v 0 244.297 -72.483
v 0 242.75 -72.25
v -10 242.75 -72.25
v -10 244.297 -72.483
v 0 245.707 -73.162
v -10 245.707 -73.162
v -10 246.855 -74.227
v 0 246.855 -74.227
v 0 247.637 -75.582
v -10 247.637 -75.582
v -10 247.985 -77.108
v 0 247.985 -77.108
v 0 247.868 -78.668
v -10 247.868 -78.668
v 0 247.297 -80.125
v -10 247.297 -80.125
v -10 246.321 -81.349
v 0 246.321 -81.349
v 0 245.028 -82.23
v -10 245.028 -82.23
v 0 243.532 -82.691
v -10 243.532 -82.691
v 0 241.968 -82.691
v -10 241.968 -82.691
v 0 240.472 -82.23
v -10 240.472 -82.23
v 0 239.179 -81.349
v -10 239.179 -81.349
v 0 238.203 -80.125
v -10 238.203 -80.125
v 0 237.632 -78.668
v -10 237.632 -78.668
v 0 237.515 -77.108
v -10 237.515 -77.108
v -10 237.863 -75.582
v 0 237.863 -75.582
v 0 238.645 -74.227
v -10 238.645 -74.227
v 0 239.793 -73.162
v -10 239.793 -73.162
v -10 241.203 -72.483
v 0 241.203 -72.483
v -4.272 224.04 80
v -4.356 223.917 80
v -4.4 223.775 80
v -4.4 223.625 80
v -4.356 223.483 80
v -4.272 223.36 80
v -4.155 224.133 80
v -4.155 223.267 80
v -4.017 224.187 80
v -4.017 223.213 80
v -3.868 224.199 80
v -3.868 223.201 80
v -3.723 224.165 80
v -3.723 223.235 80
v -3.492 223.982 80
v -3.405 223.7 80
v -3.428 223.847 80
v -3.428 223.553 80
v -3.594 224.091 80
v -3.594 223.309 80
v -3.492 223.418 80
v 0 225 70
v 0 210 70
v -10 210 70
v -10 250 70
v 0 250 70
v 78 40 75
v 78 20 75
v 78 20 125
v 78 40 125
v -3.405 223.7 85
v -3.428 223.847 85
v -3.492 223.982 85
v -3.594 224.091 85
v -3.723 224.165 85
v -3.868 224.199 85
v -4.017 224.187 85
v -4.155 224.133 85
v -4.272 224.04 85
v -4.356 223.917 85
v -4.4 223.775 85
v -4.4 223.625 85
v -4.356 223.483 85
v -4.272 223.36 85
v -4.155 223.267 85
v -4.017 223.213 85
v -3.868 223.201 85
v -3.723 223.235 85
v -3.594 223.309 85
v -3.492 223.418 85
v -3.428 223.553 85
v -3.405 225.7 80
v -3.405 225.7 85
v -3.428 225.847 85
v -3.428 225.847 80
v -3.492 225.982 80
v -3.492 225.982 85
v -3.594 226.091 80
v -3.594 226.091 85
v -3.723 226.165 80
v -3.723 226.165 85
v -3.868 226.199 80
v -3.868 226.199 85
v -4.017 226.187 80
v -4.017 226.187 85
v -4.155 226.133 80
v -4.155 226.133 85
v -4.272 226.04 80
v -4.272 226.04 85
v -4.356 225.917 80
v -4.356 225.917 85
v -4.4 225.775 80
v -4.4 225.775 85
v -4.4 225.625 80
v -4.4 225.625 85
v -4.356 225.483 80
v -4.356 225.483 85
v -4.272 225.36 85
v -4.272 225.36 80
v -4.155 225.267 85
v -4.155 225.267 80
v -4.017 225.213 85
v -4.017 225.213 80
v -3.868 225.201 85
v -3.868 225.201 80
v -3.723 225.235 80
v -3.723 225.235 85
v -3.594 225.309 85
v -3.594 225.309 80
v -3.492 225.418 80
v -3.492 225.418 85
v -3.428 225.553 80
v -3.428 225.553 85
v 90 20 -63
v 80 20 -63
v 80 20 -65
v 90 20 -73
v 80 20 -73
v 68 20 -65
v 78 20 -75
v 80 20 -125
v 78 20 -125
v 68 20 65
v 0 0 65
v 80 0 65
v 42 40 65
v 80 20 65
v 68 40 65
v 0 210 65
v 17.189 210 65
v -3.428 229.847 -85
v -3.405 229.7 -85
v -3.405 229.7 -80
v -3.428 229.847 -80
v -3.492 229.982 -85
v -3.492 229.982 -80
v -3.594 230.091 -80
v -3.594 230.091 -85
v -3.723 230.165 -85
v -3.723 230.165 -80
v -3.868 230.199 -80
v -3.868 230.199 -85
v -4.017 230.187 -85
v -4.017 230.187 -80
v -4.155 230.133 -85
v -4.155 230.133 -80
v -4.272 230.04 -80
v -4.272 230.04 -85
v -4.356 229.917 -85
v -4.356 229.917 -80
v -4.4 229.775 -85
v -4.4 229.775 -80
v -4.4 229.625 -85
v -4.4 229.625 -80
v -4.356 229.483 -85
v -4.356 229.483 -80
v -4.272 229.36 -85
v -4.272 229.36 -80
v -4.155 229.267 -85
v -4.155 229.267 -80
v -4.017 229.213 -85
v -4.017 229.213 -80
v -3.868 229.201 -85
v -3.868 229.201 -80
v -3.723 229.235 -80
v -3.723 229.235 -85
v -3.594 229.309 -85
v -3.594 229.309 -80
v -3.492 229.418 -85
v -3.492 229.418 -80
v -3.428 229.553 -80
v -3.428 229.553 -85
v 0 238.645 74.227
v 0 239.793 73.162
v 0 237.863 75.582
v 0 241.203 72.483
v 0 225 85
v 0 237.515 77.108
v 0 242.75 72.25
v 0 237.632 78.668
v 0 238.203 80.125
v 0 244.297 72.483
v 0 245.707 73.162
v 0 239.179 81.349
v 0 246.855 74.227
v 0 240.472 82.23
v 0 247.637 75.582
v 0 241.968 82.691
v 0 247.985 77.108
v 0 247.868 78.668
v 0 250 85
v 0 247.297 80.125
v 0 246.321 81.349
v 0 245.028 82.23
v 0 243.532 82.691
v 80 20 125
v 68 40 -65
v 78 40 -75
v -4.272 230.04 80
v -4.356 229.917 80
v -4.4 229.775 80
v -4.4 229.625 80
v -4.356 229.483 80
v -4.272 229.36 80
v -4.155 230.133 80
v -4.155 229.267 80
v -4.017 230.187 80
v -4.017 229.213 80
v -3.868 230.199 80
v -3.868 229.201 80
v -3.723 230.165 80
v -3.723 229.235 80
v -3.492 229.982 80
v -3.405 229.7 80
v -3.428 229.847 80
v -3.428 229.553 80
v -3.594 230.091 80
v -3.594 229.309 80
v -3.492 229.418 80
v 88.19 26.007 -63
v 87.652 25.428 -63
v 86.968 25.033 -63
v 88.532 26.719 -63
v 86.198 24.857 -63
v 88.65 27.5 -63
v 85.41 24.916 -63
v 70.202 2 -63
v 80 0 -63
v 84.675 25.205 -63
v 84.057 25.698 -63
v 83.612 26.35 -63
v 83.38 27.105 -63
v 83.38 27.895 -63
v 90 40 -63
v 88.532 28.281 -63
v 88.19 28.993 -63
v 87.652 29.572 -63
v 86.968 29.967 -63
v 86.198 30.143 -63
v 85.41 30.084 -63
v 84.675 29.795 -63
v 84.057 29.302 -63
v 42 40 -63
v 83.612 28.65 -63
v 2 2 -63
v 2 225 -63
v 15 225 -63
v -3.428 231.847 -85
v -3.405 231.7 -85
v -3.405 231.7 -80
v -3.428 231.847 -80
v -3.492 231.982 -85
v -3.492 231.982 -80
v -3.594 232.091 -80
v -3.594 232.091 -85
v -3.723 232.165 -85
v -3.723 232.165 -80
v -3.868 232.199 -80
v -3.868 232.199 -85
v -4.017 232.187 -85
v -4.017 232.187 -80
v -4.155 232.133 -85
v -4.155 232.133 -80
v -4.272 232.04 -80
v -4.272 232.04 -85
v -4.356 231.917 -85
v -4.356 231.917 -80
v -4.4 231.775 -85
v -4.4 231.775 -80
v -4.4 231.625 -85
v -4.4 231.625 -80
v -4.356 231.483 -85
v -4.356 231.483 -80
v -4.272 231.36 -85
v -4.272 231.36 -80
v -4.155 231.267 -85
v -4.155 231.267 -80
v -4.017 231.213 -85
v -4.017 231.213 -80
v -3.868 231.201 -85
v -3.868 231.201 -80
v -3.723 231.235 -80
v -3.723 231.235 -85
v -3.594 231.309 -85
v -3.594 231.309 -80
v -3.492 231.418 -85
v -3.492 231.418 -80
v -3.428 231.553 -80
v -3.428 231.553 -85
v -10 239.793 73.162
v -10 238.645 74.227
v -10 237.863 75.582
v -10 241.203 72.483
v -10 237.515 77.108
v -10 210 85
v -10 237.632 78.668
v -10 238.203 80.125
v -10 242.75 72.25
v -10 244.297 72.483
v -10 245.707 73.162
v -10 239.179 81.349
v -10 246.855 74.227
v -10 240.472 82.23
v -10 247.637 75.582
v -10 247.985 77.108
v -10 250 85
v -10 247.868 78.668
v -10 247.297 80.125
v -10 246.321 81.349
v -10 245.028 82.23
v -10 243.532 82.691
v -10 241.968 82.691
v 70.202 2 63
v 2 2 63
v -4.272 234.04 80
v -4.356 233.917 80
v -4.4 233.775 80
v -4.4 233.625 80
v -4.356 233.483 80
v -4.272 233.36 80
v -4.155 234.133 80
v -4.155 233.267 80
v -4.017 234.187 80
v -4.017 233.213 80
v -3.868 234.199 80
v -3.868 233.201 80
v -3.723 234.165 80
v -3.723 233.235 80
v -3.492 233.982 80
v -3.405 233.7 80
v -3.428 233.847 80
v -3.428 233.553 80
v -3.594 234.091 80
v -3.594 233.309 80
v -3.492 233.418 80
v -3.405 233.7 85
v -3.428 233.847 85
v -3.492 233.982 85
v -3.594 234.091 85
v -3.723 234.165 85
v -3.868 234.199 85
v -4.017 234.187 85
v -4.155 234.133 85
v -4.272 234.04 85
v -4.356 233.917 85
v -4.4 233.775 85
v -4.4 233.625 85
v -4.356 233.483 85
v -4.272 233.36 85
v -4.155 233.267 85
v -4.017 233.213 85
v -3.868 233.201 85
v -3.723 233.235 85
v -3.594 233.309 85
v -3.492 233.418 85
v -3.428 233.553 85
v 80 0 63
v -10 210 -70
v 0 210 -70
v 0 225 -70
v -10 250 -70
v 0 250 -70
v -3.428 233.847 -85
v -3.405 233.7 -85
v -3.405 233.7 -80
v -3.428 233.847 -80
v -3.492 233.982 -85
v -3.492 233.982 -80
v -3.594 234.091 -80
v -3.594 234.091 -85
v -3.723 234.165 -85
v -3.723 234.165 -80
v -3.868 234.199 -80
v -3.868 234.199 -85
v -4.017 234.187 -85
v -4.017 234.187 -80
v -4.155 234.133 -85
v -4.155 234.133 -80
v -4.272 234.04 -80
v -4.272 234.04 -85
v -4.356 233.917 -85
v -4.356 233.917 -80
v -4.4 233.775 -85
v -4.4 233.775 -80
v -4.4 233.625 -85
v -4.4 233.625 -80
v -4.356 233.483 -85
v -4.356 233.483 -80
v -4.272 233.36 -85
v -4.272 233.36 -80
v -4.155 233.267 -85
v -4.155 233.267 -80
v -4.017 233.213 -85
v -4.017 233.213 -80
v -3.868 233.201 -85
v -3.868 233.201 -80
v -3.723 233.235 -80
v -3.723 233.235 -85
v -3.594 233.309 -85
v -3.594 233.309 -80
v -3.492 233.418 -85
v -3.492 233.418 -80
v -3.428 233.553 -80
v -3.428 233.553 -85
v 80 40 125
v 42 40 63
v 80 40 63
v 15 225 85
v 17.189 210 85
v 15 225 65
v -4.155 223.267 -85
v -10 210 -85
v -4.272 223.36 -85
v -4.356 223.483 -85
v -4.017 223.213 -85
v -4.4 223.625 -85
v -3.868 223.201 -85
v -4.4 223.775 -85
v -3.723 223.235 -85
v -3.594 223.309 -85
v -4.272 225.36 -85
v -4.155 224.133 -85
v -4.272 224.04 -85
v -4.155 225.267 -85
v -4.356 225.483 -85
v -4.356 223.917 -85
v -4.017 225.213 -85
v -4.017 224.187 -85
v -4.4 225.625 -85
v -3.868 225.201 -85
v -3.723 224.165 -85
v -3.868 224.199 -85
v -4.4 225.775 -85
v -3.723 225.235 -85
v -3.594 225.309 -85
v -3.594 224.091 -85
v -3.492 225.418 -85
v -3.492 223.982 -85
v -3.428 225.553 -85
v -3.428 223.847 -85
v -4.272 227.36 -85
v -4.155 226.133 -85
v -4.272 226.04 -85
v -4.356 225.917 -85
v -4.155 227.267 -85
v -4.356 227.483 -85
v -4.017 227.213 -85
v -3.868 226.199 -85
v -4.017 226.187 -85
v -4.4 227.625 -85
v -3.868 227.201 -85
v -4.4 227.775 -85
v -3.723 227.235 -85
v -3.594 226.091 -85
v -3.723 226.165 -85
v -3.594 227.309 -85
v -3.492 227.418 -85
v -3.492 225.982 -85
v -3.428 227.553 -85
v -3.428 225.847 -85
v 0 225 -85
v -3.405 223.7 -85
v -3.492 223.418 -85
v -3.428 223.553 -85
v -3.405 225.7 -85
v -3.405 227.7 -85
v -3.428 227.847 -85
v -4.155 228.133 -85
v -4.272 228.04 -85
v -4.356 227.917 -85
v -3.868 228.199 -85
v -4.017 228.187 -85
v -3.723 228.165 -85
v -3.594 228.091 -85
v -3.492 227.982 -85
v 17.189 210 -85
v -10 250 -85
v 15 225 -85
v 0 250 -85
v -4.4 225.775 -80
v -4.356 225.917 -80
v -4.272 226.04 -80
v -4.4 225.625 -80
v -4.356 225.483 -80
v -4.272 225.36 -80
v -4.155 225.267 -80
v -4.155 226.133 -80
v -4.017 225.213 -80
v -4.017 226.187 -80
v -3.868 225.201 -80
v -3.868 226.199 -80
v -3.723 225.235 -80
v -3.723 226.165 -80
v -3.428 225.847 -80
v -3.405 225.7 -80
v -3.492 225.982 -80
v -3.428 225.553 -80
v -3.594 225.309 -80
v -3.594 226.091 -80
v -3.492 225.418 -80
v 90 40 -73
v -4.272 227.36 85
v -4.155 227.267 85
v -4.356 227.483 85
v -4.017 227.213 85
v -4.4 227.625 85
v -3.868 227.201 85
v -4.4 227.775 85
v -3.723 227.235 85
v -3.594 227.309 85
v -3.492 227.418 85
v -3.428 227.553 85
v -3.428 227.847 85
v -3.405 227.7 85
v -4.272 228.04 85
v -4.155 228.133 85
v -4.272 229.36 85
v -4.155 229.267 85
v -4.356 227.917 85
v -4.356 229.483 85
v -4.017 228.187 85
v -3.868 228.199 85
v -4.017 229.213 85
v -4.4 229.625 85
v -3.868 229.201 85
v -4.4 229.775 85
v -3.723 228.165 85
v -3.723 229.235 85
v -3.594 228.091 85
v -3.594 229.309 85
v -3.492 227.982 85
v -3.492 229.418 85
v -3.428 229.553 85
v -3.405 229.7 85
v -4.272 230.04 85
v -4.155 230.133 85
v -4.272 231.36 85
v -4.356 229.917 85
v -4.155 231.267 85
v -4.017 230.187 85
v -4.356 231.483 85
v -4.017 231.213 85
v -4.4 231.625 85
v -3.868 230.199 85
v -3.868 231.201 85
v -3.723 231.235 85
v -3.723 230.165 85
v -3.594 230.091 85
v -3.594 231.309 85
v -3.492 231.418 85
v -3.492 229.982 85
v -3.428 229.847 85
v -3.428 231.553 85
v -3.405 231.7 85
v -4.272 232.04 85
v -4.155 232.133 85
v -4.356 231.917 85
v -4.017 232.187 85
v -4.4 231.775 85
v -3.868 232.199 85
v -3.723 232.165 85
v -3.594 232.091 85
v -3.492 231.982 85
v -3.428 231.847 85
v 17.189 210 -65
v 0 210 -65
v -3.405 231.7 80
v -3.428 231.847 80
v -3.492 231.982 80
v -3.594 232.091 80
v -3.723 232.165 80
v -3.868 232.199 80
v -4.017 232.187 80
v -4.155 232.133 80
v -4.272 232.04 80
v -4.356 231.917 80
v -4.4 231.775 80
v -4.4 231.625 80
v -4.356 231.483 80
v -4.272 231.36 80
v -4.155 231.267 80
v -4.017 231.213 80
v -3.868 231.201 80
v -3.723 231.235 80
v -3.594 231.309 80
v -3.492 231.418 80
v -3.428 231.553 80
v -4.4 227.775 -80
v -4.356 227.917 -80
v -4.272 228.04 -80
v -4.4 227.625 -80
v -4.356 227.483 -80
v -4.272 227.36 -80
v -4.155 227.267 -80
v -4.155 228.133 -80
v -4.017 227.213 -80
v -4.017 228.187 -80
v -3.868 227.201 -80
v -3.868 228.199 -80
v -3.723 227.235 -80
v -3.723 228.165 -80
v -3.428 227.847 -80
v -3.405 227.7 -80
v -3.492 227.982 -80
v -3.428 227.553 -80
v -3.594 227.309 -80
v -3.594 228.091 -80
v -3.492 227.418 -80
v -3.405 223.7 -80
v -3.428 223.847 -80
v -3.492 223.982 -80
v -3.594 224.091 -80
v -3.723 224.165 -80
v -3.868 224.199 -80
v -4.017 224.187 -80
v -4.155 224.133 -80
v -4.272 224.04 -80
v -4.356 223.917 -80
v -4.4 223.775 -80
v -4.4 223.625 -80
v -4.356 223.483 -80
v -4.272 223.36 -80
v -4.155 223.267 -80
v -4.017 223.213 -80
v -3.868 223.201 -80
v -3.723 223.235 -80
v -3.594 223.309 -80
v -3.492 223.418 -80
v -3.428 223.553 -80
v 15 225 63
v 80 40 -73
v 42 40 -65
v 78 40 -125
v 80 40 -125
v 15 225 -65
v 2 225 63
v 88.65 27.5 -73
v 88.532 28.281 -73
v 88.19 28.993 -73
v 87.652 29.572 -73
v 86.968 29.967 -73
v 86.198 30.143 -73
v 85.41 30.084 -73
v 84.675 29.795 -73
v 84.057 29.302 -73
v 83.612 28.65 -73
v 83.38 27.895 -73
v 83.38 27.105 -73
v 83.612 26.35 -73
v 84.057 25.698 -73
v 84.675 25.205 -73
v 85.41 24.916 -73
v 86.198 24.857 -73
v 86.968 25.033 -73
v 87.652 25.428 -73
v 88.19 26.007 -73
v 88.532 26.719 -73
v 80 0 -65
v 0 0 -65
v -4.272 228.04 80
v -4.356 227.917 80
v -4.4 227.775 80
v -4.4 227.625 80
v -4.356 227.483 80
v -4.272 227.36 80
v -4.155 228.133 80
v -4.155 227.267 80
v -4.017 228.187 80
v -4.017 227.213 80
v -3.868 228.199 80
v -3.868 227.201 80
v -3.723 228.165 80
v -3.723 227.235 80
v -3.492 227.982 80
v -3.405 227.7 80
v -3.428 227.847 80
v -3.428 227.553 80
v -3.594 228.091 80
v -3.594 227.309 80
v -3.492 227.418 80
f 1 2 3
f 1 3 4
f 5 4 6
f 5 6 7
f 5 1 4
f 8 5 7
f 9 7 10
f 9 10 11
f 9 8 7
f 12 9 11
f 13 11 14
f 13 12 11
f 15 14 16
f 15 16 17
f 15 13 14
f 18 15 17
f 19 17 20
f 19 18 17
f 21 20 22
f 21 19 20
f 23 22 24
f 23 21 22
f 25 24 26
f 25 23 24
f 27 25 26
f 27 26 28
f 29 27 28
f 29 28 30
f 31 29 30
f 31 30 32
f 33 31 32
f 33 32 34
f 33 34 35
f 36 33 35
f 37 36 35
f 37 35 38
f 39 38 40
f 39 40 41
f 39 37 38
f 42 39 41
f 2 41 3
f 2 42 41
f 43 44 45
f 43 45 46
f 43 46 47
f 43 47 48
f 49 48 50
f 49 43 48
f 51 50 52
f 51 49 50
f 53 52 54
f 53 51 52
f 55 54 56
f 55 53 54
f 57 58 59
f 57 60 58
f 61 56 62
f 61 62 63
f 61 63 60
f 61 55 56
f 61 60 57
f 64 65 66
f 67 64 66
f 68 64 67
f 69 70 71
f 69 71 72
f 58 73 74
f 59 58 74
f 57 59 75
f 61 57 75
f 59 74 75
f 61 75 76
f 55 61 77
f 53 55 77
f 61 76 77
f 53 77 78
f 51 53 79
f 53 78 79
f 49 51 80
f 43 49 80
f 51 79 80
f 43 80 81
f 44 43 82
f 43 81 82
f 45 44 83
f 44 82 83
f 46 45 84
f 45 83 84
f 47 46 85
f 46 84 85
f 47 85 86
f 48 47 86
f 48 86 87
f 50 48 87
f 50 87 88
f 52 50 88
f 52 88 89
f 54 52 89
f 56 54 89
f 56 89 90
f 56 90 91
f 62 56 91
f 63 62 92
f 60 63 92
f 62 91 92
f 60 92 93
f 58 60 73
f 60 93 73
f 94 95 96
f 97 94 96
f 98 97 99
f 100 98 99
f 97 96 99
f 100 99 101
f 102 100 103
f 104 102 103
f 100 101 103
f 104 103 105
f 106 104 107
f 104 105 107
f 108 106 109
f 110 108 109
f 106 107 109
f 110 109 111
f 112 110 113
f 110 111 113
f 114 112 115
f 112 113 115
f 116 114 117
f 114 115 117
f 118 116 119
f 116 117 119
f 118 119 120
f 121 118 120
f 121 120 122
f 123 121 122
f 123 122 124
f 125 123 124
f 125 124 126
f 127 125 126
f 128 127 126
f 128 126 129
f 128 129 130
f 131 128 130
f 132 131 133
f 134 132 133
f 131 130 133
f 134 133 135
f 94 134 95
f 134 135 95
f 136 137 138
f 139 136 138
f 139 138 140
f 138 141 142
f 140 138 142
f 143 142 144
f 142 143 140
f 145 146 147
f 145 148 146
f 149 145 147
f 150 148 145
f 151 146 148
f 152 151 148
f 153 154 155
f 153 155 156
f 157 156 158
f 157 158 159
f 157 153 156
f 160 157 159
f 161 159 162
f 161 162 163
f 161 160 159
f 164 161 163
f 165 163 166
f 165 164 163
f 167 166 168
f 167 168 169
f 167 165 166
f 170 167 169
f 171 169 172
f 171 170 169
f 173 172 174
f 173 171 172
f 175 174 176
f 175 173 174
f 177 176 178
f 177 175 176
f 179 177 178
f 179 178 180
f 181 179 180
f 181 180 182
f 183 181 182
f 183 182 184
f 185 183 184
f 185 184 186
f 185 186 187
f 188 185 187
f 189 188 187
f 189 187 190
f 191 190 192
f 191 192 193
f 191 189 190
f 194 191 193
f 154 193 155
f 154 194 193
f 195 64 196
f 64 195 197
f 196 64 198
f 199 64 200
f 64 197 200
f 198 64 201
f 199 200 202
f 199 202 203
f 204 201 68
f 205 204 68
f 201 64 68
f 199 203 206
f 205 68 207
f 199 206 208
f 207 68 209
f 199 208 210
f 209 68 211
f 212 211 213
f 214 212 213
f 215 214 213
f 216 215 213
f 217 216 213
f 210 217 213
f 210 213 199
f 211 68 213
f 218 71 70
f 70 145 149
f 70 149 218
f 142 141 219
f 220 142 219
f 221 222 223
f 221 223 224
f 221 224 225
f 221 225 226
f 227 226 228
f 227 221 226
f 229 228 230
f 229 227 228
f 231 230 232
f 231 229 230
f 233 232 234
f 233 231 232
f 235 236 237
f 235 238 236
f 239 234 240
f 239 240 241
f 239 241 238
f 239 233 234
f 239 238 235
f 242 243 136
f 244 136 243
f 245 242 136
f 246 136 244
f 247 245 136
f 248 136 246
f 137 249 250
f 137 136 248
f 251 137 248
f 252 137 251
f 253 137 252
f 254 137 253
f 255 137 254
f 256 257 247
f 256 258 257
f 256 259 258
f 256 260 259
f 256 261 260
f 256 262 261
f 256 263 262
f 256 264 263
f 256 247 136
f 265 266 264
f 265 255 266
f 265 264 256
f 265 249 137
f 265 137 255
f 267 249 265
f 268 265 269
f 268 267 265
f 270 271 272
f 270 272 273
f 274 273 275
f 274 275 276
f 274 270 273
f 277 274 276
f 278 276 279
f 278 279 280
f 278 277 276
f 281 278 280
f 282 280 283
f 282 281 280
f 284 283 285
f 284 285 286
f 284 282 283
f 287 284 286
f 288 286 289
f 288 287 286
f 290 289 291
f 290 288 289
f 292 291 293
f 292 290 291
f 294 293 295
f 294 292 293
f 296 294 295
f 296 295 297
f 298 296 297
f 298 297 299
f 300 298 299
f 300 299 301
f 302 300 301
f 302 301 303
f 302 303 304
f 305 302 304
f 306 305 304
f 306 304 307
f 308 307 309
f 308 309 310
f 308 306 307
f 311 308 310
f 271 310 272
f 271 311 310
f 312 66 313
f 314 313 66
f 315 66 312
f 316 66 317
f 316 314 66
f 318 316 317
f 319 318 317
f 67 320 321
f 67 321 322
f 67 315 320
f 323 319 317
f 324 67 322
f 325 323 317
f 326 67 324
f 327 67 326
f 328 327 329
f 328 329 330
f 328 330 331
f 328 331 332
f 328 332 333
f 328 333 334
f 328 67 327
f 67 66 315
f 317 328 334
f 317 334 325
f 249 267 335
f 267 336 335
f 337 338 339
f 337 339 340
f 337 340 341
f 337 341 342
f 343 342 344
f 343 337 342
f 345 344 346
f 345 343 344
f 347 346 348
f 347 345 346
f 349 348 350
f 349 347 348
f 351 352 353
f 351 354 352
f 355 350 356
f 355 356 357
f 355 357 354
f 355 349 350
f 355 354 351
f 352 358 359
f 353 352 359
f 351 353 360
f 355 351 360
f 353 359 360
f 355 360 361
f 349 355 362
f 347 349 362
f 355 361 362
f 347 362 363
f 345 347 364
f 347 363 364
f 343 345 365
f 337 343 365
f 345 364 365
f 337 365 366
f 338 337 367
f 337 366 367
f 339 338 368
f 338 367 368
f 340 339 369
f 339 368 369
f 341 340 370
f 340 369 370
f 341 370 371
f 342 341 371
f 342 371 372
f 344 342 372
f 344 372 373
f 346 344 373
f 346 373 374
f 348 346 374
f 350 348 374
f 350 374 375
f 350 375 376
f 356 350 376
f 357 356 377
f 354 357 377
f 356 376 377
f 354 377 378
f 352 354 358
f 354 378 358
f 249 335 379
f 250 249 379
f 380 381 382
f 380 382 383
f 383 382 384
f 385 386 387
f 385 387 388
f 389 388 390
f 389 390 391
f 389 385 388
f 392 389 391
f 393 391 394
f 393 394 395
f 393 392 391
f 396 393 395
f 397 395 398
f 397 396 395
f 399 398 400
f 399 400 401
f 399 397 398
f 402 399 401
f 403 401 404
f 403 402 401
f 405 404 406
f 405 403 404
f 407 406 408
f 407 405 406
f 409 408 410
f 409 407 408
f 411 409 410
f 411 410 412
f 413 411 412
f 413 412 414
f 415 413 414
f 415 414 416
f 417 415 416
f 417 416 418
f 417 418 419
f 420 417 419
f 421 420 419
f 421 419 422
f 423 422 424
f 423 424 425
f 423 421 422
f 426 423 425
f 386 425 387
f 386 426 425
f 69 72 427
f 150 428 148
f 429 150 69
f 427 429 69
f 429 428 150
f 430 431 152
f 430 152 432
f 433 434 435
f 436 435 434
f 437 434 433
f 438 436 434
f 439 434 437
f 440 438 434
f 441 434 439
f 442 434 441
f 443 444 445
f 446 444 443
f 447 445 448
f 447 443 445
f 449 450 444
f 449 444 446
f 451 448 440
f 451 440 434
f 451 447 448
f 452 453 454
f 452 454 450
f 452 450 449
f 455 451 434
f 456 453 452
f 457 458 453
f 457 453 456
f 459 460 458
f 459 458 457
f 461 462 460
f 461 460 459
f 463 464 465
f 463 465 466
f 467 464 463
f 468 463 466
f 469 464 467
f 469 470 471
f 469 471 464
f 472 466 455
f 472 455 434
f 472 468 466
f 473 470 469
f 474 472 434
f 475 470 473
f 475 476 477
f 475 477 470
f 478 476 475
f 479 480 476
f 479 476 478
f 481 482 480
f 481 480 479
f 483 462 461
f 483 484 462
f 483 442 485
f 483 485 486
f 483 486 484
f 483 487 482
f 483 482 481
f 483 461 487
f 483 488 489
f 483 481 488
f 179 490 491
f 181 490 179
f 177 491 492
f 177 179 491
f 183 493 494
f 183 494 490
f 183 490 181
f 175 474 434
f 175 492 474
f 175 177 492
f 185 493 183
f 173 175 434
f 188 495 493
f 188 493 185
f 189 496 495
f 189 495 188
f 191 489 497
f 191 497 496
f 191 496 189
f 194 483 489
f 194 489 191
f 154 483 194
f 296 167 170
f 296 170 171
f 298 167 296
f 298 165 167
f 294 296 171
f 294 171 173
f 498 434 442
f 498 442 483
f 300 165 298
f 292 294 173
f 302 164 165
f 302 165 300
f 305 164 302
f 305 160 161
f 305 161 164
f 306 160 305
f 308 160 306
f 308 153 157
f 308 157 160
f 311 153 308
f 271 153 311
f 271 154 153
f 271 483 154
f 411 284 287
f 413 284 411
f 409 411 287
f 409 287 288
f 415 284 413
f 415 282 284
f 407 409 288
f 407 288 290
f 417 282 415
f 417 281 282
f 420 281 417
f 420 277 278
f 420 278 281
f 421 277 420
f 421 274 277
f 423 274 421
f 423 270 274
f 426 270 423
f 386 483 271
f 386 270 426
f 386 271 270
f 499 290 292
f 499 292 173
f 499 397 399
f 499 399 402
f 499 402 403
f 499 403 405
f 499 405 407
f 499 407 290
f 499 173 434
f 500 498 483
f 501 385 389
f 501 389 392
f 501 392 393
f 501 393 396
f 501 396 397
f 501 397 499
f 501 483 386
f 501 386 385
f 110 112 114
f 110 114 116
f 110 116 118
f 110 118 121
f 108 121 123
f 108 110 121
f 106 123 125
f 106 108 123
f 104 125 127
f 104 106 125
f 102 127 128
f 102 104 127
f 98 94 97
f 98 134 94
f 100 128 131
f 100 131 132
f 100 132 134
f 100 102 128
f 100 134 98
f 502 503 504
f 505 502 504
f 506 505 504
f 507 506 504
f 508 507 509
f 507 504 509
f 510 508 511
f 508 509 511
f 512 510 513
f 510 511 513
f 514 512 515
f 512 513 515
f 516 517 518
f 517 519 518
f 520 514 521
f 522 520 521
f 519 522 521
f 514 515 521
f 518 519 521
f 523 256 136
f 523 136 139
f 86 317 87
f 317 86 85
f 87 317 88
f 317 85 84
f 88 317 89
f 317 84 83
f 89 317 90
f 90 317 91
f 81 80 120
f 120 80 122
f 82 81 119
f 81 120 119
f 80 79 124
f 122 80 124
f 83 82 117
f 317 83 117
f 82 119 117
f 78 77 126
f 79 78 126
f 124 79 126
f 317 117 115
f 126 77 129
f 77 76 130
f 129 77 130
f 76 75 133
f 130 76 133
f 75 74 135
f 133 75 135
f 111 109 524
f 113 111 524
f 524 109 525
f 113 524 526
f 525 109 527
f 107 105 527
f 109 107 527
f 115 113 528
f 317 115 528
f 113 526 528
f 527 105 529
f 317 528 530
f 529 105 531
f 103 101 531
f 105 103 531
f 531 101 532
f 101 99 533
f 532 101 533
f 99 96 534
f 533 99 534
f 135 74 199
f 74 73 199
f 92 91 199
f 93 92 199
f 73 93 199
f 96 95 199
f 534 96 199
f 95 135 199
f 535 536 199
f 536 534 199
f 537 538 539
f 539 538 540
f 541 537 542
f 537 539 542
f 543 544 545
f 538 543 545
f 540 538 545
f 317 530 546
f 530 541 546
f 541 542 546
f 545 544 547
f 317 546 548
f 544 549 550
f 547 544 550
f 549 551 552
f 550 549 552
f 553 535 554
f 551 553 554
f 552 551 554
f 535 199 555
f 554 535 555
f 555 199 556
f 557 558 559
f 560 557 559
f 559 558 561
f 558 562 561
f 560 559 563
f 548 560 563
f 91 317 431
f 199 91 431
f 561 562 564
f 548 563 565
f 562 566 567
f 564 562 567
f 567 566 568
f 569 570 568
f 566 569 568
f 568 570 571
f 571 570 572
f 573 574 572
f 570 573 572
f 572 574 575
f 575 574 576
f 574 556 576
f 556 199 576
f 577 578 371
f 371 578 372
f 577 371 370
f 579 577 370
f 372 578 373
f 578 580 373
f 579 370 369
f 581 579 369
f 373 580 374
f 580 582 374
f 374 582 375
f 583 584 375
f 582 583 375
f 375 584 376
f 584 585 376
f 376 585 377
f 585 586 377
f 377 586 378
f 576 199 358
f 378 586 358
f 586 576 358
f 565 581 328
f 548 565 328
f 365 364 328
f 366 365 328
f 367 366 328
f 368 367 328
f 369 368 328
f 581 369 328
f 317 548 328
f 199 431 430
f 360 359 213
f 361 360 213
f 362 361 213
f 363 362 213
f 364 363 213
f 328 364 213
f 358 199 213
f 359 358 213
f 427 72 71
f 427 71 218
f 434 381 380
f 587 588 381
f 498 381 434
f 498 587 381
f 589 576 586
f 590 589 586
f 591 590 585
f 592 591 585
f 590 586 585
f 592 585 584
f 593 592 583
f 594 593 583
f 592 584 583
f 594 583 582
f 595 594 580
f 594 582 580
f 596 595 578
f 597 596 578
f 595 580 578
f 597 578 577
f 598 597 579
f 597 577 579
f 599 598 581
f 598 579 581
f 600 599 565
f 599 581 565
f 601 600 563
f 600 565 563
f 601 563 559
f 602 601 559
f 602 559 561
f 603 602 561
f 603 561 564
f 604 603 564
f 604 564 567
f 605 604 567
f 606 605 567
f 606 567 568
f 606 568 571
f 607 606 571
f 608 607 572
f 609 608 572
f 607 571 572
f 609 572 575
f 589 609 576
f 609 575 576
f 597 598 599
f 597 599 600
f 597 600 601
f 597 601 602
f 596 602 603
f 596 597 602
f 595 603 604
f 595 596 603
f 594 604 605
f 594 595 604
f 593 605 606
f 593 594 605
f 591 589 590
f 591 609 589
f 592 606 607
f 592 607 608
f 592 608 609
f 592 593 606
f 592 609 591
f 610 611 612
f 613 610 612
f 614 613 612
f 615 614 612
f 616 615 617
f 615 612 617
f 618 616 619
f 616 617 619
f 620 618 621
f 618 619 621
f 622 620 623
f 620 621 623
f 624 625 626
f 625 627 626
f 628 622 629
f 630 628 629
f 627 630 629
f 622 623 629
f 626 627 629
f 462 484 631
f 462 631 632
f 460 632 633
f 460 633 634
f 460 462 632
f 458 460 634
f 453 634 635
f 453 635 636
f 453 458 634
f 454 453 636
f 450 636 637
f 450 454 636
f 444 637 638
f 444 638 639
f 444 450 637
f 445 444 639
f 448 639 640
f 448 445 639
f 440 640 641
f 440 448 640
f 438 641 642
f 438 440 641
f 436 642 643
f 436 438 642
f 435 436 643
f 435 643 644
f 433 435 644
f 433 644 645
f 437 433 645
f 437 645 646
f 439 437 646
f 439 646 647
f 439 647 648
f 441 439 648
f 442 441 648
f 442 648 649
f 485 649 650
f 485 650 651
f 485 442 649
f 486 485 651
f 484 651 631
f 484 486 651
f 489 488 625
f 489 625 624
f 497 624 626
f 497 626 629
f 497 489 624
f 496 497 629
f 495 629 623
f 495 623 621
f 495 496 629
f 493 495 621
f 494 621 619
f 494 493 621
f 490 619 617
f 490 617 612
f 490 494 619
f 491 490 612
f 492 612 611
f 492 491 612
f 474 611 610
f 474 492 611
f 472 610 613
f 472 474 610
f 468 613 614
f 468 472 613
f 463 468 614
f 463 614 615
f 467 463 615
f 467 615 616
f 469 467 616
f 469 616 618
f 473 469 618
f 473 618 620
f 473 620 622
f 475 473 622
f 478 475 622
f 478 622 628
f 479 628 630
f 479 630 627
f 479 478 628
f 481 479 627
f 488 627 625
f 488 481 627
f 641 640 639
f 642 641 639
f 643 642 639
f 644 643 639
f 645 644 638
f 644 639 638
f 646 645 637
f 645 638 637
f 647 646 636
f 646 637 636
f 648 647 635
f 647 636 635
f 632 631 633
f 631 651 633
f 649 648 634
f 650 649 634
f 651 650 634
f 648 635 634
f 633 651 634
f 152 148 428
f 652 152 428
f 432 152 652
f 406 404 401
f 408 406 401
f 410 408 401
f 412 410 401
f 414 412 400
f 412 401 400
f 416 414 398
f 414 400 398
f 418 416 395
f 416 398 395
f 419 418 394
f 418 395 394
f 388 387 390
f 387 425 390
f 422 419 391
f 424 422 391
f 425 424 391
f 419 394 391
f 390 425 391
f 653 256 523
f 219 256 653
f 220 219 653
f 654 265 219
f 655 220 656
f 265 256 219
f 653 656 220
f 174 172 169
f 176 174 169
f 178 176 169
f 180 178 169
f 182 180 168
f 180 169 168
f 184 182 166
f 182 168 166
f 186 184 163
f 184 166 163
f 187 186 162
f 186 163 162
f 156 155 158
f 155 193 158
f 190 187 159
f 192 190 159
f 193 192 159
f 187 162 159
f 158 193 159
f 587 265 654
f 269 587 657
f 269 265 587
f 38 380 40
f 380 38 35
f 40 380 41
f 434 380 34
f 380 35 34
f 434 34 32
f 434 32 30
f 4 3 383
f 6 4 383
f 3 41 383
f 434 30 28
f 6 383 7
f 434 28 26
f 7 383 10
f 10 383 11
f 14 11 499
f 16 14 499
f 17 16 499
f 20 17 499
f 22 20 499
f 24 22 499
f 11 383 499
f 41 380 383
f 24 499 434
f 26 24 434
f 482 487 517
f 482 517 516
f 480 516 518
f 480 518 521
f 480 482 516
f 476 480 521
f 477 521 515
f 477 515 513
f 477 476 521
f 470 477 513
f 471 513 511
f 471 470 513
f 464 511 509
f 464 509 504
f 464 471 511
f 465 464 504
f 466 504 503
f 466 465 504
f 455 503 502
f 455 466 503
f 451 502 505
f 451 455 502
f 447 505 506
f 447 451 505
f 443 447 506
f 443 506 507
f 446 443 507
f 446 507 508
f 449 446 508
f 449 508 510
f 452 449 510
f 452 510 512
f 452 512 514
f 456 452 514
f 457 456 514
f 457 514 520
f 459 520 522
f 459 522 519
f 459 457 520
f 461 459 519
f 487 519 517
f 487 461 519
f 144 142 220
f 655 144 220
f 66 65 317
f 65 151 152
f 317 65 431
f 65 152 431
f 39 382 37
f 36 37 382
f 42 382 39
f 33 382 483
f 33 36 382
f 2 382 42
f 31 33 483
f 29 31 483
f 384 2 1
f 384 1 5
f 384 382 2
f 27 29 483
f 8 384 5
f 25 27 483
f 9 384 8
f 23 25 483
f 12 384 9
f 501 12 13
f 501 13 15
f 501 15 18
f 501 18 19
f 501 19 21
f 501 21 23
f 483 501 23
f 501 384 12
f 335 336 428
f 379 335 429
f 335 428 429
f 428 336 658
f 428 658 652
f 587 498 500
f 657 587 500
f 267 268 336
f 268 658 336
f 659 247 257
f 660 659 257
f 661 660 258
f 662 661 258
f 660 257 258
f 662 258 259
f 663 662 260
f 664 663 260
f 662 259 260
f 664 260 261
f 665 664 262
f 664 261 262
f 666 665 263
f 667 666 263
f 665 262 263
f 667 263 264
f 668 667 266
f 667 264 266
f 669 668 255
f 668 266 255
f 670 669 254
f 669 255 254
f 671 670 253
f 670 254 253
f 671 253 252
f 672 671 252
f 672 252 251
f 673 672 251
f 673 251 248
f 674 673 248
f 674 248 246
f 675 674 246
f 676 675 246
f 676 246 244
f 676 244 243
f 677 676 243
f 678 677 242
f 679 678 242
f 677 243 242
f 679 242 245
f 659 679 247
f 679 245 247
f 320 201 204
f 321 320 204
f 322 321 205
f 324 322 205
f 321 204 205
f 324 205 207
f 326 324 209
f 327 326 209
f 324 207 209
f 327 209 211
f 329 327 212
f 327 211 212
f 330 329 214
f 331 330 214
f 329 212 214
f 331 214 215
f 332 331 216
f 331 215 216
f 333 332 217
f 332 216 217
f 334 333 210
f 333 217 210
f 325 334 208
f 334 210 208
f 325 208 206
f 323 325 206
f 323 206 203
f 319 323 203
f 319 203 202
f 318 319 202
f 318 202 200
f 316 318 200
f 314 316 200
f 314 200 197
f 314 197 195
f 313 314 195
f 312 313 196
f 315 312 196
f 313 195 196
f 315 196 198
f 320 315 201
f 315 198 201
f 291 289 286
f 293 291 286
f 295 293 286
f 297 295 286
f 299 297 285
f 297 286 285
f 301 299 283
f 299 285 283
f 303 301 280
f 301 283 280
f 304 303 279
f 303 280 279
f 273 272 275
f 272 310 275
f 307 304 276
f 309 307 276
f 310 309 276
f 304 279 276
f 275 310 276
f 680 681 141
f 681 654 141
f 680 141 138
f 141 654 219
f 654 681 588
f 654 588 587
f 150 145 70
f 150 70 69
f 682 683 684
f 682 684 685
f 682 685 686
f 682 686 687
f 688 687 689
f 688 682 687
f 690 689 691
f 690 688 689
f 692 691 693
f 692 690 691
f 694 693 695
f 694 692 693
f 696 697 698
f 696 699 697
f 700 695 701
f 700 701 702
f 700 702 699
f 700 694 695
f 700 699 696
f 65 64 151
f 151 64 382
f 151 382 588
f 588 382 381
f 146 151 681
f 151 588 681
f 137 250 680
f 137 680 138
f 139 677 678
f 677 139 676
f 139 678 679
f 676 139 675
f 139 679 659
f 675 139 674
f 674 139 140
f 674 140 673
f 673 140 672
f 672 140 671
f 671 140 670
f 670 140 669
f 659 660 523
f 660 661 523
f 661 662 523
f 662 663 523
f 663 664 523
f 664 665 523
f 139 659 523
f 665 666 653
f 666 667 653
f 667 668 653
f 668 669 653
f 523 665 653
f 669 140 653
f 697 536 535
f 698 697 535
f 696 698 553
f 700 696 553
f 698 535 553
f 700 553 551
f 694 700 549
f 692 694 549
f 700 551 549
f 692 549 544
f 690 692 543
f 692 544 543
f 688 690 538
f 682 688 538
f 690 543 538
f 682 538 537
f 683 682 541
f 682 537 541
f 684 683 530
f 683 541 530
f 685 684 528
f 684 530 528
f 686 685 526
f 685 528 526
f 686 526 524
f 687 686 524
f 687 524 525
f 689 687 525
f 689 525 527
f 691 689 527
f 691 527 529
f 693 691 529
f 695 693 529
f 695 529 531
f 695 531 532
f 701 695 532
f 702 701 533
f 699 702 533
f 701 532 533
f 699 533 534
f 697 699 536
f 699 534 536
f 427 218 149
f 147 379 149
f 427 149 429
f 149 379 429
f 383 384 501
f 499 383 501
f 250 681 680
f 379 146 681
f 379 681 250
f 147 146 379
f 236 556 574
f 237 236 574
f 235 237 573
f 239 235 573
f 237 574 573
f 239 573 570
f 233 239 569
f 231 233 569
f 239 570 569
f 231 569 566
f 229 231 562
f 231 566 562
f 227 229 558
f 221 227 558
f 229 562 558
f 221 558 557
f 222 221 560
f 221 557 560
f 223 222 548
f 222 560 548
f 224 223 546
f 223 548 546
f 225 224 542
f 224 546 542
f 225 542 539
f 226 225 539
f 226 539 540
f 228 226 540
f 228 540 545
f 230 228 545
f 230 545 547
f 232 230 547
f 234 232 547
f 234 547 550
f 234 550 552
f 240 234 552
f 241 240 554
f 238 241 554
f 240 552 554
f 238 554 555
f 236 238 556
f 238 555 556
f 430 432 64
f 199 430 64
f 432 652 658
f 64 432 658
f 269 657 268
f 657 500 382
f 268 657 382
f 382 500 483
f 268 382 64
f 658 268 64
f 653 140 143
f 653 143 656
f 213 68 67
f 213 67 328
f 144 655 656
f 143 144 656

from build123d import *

# Parameters (mm, degrees)
BOSS_EXTRUDE2_DEPTH = 65
CUT_EXTRUDE1_DEPTH  = 63
BOSS_EXTRUDE6_DEPTH = 20
SKETCH26_W          = 15
SKETCH26_H          = 40
BOSS_EXTRUDE7_DEPTH = 10
SKETCH27_R          = 0.5
CUT_EXTRUDE3_DEPTH  = 5
SKETCH29_R          = 5.25
CUT_EXTRUDE4_DEPTH  = 10
SKETCH30_W          = 2
SKETCH30_H          = 20
BOSS_EXTRUDE8_DEPTH = 60
CHAMFER1_SIZE       = 10
SKETCH32_W          = 10
SKETCH32_H          = 20
BOSS_EXTRUDE9_DEPTH = 10
SKETCH33_R          = 2.65
CUT_EXTRUDE5_DEPTH  = 10


with BuildPart() as part:
    # Sketch2 → Boss-Extrude2 (new, symmetric)
    with BuildSketch(Plane.XY):
        Polygon((15, 225), (0, 225), (0, 0), (80, 0), (80, 40), (42, 40), align=None)
    extrude(amount=BOSS_EXTRUDE2_DEPTH, both=True)

    # Sketch5 → Cut-Extrude1 (cut, symmetric)
    with BuildSketch(Plane.XY):
        Polygon((2, 2), (70.202041029, 2), (80, 0), (80, 40), (42, 40), (15, 225), (2, 225), align=None)
    extrude(amount=CUT_EXTRUDE1_DEPTH, both=True, mode=Mode.SUBTRACT)

    # Sketch25 → Boss-Extrude6 (add)
    with BuildSketch(Plane.XY.offset(65)):
        Polygon((17.189189189, 210), (15, 225), (0, 225), (0, 210), align=None)
    extrude(amount=BOSS_EXTRUDE6_DEPTH)

    # Sketch26 → Boss-Extrude7 (add)
    with BuildSketch(Plane.ZY):
        with Locations((77.5, 230)):
            Rectangle(SKETCH26_W, SKETCH26_H)
    extrude(amount=BOSS_EXTRUDE7_DEPTH)

    # Sketch27 → Cut-Extrude3 (cut)
    with BuildSketch(Plane.XY.offset(85)):
        with Locations((-3.905405405, 231.7)):
            Circle(SKETCH27_R)
        with Locations((-3.905405405, 233.7)):
            Circle(SKETCH27_R)
        with Locations((-3.905405405, 229.7)):
            Circle(SKETCH27_R)
        with Locations((-3.905405405, 227.7)):
            Circle(SKETCH27_R)
        with Locations((-3.905405405, 225.7)):
            Circle(SKETCH27_R)
        with Locations((-3.905405405, 223.7)):
            Circle(SKETCH27_R)
    extrude(amount=-CUT_EXTRUDE3_DEPTH, mode=Mode.SUBTRACT)

    # Sketch29 → Cut-Extrude4 (cut)
    with BuildSketch(Plane(origin=(0, 0, 0), x_dir=(0, 0, -1), z_dir=(1, 0, 0))):
        with Locations((-77.5, 242.75)):
            Circle(SKETCH29_R)
    extrude(amount=-CUT_EXTRUDE4_DEPTH, mode=Mode.SUBTRACT)

    # Sketch30 → Boss-Extrude8 (add)
    with BuildSketch(Plane.XY.offset(65)):
        with Locations((79, 30)):
            Rectangle(SKETCH30_W, SKETCH30_H)
    extrude(amount=BOSS_EXTRUDE8_DEPTH)

    # Chamfer1
    chamfer1_edges = [part.edges().sort_by_distance(p)[0] for p in [
        (78, 30, 65),
    ]]
    chamfer(chamfer1_edges, length=CHAMFER1_SIZE)

    # Mirror3: part across plane


with BuildPart() as part_1:
    add(part.part)
    add(part.part.mirror(Plane(origin=(0, 0, 0), x_dir=(1, 0, 0), z_dir=(0, 0, -1))))

    # Sketch32 → Boss-Extrude9 (add)
    with BuildSketch(Plane(origin=(80, 0, 0), x_dir=(0, 0, -1), z_dir=(1, 0, 0))):
        with Locations((68, 30)):
            Rectangle(SKETCH32_W, SKETCH32_H)
    extrude(amount=BOSS_EXTRUDE9_DEPTH)

    # Sketch33 → Cut-Extrude5 (cut)
    with BuildSketch(Plane.XY.offset(-63)):
        with Locations((86, 27.5)):
            Circle(SKETCH33_R)
    extrude(amount=-CUT_EXTRUDE5_DEPTH, mode=Mode.SUBTRACT)


solid = part_1.part
